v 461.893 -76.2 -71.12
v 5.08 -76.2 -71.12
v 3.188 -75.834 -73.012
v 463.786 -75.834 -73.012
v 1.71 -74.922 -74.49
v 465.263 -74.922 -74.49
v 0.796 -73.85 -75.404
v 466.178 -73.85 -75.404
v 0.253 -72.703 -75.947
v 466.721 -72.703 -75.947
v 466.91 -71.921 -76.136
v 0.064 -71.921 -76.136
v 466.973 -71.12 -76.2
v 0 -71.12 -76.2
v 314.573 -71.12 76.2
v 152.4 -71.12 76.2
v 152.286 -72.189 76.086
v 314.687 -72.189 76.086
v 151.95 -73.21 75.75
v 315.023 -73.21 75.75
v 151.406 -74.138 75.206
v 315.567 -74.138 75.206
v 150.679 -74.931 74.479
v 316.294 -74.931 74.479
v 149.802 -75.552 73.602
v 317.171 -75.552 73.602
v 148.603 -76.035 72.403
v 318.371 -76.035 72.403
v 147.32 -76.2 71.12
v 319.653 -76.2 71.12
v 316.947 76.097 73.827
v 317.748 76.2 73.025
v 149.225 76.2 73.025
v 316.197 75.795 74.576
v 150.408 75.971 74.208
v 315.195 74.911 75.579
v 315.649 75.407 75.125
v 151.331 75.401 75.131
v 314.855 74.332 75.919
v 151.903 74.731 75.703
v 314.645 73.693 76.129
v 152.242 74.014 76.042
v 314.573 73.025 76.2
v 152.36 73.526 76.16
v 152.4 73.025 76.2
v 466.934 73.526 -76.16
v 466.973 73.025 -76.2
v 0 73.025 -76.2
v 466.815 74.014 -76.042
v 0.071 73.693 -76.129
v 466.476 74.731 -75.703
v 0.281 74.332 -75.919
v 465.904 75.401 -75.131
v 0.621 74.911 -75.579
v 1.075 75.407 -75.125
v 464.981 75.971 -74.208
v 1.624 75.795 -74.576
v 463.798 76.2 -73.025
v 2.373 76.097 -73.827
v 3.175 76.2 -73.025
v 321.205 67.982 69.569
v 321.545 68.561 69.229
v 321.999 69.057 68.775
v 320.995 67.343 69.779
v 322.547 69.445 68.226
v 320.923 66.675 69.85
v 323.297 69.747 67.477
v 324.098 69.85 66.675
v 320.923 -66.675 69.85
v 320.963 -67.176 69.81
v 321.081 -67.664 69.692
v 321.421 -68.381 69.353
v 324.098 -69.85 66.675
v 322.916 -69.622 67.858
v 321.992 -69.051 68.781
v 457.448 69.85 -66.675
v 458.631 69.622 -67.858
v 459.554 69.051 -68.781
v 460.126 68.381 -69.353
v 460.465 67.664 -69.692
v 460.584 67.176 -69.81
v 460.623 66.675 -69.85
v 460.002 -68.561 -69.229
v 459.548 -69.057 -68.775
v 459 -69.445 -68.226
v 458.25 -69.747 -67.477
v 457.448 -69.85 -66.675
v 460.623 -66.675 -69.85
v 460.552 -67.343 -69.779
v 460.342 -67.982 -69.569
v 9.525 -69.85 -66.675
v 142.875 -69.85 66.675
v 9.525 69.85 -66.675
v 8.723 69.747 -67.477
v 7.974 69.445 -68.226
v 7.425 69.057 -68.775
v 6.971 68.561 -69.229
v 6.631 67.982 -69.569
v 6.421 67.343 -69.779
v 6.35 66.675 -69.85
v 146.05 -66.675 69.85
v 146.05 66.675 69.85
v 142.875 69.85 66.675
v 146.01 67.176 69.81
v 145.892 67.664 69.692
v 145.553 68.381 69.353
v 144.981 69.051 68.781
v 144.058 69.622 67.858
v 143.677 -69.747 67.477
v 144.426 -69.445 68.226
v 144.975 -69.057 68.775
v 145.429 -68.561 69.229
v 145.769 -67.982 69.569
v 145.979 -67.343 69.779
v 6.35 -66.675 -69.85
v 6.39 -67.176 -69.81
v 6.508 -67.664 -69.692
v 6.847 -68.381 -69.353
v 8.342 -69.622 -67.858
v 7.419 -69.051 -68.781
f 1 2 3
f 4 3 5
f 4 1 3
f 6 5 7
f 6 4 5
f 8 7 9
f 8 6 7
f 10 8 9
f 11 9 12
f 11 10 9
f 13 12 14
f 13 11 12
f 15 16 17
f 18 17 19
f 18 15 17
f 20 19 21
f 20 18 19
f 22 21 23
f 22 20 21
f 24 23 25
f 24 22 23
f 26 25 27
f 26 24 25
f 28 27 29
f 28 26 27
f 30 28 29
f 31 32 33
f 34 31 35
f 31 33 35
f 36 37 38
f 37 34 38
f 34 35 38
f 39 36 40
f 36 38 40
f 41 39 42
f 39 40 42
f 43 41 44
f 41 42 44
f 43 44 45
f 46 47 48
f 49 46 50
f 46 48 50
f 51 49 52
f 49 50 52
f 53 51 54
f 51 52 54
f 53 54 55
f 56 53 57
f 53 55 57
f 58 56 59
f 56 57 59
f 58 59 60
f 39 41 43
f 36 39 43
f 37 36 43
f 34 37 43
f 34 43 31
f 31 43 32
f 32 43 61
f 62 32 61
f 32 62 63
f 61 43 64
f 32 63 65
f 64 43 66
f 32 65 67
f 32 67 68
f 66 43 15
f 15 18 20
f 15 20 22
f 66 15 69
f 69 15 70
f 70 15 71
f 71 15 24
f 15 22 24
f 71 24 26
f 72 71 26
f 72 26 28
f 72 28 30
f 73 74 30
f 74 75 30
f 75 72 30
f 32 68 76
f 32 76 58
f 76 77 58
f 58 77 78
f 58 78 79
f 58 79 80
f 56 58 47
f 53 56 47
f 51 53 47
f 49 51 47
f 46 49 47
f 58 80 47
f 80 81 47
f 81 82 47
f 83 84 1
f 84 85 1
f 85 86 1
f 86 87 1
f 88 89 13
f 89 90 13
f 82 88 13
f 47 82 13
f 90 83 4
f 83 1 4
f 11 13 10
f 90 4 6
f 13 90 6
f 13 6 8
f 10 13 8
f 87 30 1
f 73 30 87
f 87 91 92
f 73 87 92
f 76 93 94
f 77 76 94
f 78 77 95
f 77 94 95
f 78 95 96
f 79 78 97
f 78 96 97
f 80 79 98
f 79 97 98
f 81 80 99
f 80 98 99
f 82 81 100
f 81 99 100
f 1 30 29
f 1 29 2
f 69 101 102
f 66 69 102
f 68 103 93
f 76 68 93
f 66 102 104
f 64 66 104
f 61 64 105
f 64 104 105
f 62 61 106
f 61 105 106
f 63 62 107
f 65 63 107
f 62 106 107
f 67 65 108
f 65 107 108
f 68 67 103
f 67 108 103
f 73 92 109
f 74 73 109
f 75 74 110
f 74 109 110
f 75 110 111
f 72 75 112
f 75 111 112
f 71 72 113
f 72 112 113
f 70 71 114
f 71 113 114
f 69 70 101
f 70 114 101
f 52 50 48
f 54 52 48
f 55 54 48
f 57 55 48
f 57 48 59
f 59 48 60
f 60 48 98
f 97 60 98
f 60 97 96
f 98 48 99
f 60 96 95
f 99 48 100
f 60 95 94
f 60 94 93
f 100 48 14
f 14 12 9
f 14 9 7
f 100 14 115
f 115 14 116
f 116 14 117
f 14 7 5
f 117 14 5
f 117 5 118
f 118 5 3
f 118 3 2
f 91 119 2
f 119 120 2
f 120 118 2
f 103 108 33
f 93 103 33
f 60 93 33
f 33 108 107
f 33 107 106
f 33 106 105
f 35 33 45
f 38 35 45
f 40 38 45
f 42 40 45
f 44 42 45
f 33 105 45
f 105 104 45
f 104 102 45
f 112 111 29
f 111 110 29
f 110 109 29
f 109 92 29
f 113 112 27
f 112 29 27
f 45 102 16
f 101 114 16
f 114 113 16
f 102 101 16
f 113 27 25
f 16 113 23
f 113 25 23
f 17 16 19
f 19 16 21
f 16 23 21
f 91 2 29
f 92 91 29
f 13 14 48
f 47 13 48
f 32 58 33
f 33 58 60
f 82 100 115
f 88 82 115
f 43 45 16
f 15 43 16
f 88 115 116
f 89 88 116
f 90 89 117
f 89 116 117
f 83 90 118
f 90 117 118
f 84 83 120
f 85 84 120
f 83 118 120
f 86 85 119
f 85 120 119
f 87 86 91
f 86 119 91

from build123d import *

# Parameters (mm, degrees)
F1_DEPTH = 466.973412
F3_DEPTH = 152.401
F4_R     = 5.08


with BuildPart() as f1:
    # F0 (on Right) → F1 (new body)
    with BuildSketch(Plane.YZ):
        with BuildLine():
            Line((73.025, 76.2), (-76.2, 76.2))
            Line((-76.2, 76.2), (-76.2, -76.2))
            Line((-76.2, -76.2), (73.025, -76.2))
            ThreePointArc((73.025, -76.2), (75.270064, -75.270064), (76.2, -73.025))
            Line((76.2, -73.025), (76.2, 73.025))
            ThreePointArc((76.2, 73.025), (75.270064, 75.270064), (73.025, 76.2))
        make_face()
        with BuildLine():
            Line((-69.850001, -66.674999), (-69.850001, 66.675001))
            ThreePointArc((-69.850001, 66.675001), (-68.920065, 68.920065), (-66.675001, 69.850001))
            Line((-66.675001, 69.850001), (66.675001, 69.850001))
            ThreePointArc((66.675001, 69.850001), (68.920065, 68.920065), (69.850001, 66.675001))
            Line((69.850001, 66.675001), (69.850001, -66.674999))
            ThreePointArc((69.850001, -66.674999), (68.920065, -68.920063), (66.675001, -69.849999))
            Line((66.675001, -69.849999), (-66.675001, -69.849999))
            ThreePointArc((-66.675001, -69.849999), (-68.920065, -68.920063), (-69.850001, -66.674999))
        make_face(mode=Mode.SUBTRACT)
    extrude(amount=F1_DEPTH)

    # F2 (on face) → F3 (cut, through all)
    with BuildSketch(Plane.XZ.offset(76.2)):
        Polygon((0, 76.2), (0, -76.2), (152.4, 76.2), align=None)
        Polygon((314.573412, 76.2), (466.973412, -76.2), (466.973412, 76.2), align=None)
    extrude(amount=-F3_DEPTH, mode=Mode.SUBTRACT)

    # F4
    f4_edges = [f1.edges().sort_by_distance(p)[0] for p in [
        (233.486706, -76.2, 76.2),
        (233.486706, -76.2, -76.2),
    ]]
    fillet(f4_edges, radius=F4_R)


solid = f1.part
